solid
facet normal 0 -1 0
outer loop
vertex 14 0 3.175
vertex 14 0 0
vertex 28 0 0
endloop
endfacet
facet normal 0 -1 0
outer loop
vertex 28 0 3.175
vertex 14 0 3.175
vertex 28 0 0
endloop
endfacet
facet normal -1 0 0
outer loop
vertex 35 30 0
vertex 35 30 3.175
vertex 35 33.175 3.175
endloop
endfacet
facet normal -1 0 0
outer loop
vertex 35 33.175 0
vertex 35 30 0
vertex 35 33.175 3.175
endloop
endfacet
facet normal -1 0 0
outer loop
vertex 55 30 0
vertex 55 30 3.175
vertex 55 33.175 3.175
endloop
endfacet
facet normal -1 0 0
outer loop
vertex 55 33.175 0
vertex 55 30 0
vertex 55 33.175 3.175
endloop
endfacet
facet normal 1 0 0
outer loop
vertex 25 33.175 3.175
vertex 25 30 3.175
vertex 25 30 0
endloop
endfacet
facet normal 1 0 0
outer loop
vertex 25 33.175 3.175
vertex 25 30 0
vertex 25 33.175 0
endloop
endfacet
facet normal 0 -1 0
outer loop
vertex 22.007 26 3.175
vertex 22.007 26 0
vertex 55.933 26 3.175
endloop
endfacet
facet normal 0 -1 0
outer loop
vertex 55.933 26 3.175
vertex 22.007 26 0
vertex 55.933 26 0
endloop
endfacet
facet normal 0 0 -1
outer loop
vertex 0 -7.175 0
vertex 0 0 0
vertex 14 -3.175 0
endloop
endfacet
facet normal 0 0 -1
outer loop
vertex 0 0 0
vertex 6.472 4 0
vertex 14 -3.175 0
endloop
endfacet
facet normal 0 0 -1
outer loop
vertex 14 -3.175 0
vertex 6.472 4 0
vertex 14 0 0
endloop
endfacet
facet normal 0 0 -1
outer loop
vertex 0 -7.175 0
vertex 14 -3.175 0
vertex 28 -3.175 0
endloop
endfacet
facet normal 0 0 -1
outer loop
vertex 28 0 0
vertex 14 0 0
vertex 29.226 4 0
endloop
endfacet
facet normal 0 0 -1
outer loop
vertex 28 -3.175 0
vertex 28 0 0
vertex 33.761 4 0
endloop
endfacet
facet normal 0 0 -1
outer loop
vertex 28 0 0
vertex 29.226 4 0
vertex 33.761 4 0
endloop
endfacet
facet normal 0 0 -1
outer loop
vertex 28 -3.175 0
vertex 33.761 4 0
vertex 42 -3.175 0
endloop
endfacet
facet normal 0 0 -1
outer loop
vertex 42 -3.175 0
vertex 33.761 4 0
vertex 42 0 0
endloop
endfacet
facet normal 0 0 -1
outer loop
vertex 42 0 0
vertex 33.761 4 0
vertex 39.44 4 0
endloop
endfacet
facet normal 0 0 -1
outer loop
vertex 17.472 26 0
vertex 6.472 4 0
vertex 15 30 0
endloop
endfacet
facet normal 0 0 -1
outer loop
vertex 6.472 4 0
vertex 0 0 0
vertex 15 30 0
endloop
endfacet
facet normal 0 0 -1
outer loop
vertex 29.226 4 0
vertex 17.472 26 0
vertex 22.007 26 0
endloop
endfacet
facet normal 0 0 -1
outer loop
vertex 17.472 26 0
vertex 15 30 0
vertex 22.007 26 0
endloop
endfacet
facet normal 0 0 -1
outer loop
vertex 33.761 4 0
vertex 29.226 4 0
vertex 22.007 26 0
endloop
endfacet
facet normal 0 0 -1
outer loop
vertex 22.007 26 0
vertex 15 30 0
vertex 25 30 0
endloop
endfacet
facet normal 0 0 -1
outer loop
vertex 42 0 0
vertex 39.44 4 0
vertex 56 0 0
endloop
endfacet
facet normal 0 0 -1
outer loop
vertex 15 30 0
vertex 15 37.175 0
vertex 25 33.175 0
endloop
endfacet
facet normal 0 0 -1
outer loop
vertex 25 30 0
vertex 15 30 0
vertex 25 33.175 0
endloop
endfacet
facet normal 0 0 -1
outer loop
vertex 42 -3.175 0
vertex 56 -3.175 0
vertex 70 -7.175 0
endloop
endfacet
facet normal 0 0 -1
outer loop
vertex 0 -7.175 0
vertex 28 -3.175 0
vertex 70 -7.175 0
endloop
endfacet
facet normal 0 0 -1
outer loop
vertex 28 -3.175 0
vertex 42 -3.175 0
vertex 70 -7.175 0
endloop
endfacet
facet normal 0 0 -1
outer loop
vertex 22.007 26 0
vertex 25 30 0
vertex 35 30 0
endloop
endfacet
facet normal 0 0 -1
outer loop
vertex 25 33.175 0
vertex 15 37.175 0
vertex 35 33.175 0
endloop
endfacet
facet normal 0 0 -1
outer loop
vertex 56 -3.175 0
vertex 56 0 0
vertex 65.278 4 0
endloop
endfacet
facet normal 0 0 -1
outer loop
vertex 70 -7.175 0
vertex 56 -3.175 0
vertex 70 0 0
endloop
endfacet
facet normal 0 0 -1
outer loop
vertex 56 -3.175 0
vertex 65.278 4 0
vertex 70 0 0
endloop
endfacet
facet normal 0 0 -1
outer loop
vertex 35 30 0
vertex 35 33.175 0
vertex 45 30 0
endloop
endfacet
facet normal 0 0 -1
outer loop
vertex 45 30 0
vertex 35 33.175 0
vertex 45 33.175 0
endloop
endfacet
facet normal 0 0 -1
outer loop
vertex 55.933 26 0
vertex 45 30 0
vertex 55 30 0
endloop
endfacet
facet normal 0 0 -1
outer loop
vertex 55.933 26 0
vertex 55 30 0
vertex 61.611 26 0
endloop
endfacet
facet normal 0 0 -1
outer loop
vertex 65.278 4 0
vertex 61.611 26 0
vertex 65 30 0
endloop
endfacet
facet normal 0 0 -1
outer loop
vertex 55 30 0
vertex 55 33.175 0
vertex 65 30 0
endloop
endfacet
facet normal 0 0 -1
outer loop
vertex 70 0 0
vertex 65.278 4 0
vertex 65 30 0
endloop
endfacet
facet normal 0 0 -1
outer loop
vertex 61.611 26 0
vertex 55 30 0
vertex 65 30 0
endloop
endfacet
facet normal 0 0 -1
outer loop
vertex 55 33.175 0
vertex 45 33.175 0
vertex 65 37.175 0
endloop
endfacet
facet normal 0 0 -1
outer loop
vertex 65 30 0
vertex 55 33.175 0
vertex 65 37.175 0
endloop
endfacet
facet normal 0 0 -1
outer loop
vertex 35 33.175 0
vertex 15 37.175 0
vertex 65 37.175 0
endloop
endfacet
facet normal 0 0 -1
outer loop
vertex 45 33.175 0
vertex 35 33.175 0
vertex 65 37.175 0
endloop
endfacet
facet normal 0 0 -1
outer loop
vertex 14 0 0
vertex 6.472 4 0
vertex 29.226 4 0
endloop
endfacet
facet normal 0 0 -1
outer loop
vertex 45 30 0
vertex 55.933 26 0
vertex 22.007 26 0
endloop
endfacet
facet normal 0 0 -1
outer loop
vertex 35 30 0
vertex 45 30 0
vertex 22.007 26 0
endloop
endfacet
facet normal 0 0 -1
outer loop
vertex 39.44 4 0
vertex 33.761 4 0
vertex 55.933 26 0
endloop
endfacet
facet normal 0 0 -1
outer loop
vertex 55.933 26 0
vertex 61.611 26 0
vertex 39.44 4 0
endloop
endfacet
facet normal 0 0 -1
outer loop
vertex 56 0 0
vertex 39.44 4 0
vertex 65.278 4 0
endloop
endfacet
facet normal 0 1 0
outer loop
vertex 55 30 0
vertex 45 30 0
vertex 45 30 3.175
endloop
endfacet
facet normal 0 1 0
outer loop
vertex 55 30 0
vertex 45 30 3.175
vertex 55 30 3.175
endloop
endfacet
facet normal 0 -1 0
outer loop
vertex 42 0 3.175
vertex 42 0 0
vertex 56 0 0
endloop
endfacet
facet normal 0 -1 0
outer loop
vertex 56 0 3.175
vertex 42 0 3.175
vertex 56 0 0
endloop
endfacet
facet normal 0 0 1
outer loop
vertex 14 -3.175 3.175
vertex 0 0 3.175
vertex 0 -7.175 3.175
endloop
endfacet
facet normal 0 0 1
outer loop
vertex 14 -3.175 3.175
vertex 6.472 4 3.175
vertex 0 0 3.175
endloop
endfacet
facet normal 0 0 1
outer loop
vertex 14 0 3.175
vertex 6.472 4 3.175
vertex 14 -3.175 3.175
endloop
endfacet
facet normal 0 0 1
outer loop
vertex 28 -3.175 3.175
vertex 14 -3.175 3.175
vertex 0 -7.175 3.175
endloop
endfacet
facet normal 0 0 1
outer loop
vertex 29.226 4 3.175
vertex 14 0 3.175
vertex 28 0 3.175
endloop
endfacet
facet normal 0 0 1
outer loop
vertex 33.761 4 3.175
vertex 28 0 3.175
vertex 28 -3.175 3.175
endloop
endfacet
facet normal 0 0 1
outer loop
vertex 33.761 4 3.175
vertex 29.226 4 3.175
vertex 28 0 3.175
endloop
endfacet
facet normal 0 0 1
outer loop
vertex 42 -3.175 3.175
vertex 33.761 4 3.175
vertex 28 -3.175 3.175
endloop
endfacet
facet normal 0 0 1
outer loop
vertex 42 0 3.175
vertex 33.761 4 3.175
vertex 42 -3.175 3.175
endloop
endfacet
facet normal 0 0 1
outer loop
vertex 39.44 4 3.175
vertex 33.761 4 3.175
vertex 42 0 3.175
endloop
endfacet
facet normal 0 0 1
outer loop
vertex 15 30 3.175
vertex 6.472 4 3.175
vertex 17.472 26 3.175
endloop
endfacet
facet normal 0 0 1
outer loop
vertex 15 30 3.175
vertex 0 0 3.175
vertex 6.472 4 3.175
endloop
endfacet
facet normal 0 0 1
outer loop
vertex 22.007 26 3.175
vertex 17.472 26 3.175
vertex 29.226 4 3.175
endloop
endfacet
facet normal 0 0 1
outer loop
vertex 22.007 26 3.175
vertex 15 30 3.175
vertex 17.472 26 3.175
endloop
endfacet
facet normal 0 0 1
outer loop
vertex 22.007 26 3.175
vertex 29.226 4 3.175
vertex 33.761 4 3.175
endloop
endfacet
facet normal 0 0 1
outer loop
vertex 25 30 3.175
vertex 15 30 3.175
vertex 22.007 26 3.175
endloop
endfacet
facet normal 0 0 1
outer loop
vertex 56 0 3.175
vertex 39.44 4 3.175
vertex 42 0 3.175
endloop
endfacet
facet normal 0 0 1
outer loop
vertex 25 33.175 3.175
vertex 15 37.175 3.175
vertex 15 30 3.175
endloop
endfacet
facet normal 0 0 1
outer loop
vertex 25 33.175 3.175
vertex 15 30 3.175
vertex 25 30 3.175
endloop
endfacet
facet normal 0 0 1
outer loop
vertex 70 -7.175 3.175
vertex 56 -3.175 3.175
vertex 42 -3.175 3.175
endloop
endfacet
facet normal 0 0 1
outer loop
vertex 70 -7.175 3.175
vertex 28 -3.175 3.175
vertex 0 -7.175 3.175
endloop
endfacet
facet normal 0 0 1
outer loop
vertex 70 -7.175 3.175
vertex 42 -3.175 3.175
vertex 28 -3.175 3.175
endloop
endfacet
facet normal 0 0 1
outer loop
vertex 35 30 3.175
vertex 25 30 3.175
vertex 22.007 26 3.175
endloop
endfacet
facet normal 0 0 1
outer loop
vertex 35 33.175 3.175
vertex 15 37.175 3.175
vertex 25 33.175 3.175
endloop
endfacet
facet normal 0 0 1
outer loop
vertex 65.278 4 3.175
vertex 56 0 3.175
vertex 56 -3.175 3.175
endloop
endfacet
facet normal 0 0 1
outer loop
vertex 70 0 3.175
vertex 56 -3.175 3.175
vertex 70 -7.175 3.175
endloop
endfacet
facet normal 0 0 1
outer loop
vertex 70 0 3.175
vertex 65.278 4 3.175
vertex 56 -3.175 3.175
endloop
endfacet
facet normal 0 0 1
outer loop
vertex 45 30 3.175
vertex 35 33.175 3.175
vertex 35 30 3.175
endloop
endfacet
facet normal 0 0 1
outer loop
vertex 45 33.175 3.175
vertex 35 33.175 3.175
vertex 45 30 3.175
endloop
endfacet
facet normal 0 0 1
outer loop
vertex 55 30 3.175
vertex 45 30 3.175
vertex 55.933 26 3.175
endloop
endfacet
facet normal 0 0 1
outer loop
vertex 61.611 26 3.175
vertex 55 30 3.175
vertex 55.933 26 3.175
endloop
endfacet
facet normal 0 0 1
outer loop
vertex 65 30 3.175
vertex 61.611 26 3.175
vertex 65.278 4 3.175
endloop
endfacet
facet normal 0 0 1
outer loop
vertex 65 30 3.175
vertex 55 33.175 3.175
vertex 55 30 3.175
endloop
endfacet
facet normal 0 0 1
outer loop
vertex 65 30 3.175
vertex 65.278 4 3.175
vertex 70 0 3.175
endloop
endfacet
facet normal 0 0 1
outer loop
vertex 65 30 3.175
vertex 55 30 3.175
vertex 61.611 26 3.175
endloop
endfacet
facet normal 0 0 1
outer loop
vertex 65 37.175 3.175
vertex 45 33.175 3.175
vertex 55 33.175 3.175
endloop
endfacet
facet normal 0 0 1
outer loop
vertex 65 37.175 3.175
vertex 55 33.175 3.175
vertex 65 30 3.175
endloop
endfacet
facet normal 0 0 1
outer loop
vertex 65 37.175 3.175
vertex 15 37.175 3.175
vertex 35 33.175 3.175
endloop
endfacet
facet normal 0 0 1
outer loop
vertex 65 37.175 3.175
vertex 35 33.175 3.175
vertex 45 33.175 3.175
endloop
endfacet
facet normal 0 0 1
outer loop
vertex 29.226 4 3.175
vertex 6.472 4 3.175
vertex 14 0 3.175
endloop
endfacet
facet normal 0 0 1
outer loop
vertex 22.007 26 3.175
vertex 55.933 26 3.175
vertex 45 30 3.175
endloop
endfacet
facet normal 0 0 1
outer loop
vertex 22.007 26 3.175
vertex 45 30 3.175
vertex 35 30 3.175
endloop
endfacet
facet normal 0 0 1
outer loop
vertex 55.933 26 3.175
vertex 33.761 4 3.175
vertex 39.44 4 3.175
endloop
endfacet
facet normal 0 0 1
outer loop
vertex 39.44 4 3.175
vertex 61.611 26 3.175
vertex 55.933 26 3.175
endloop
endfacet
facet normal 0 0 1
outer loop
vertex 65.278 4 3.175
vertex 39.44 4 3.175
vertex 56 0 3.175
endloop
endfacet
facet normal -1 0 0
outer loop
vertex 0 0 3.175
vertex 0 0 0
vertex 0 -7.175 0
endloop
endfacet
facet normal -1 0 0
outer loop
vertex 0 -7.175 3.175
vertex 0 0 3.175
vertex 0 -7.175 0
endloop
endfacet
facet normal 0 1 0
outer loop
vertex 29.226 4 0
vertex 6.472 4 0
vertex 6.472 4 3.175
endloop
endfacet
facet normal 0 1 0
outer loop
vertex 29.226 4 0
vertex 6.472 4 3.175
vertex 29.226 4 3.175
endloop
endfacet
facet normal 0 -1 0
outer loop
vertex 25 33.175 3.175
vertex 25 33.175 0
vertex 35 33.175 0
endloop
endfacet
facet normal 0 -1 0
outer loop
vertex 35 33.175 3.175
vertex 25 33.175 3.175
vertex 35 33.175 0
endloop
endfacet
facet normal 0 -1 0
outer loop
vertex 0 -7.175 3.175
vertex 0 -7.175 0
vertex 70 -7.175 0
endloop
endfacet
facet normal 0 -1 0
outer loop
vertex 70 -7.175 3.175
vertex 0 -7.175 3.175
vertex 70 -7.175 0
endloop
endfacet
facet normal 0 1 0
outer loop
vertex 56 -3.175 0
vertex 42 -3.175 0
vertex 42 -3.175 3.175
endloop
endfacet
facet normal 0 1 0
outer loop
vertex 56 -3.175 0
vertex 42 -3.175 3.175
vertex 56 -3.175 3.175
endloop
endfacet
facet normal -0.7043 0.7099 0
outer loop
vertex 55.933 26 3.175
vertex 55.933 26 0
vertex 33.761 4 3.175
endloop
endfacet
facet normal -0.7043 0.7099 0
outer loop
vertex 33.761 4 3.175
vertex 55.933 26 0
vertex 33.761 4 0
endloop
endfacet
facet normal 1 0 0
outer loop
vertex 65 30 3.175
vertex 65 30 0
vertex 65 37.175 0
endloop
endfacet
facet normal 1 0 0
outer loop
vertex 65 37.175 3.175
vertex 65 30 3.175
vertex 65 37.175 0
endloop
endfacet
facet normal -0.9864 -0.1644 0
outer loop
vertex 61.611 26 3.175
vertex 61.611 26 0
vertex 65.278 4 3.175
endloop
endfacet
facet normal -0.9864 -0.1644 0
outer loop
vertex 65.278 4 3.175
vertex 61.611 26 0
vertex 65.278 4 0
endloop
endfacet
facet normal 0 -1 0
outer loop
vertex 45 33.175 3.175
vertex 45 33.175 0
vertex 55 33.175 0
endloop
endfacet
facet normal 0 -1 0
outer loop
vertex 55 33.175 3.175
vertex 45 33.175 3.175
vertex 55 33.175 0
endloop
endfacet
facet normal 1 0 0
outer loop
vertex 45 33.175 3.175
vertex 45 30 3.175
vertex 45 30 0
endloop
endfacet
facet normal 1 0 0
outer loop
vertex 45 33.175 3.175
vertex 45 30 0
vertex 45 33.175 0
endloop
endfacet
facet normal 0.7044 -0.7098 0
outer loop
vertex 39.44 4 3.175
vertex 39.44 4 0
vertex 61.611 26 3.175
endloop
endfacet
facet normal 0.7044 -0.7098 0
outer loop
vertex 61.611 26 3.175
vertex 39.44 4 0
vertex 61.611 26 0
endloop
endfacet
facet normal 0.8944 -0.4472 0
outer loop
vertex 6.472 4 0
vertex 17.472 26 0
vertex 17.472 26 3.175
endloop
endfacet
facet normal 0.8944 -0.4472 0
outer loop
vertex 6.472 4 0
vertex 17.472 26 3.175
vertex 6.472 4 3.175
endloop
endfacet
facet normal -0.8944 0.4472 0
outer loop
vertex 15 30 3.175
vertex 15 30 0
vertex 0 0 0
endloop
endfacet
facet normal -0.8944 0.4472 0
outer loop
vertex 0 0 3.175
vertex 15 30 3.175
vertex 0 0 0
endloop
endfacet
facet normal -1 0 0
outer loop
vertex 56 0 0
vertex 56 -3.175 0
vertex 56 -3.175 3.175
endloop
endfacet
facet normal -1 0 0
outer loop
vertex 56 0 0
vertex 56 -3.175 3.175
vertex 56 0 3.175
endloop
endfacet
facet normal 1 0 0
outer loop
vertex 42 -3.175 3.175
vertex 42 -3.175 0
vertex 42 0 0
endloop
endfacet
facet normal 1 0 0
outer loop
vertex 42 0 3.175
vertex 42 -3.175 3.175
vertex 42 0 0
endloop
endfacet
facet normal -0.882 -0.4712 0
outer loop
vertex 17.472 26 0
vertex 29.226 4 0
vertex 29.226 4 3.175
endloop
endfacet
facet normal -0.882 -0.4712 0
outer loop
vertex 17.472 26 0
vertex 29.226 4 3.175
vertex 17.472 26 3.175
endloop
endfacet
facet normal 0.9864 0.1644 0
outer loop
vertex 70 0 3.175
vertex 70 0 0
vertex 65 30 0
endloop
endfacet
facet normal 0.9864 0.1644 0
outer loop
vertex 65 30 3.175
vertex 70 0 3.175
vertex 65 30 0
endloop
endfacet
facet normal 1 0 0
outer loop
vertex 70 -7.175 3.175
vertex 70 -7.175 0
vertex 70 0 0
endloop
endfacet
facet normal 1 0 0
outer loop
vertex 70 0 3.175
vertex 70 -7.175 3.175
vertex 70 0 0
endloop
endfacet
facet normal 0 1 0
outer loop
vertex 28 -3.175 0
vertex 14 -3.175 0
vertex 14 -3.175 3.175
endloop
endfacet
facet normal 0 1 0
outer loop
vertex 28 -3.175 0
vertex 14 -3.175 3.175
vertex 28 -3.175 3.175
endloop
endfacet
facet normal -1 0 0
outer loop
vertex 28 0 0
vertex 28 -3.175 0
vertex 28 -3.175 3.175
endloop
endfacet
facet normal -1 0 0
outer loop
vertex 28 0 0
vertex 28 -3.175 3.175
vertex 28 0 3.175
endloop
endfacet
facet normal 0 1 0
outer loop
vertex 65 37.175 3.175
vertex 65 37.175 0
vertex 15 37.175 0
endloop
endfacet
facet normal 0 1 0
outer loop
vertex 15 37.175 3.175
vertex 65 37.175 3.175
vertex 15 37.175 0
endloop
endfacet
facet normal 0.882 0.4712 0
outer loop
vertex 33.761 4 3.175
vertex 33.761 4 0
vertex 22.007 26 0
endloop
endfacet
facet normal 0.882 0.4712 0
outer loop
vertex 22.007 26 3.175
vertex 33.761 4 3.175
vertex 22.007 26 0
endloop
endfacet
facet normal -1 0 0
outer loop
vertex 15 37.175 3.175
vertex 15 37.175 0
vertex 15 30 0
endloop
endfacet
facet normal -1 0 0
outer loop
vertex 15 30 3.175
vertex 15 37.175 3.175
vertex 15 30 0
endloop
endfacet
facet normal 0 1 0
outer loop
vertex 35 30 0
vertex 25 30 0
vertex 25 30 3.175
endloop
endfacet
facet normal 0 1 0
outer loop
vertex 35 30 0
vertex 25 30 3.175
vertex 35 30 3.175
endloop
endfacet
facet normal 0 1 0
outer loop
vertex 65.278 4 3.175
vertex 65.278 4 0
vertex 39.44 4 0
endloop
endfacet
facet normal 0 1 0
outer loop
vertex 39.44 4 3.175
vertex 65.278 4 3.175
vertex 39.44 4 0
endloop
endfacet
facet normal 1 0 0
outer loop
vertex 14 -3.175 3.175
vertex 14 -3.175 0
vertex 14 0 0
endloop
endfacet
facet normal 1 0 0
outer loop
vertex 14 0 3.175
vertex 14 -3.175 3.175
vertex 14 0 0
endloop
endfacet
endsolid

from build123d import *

# Parameters (mm, degrees)
SKETCH1_W           = 10
SKETCH1_H           = 3.175
SKETCH1_W_2         = 14
BOSS_EXTRUDE1_DEPTH = 3.175
CUT_EXTRUDE1_REACH  = 81.323


with BuildPart() as part:
    # Sketch1 → Boss-Extrude1 (new body)
    with BuildSketch(Plane.XY):
        Polygon((15, 30), (0, 0), (0, -7.175), (70, -7.175), (70, 0), (65, 30), (65, 37.175), (15, 37.175), align=None)
        with Locations((30, 31.5875)):
            Rectangle(SKETCH1_W, SKETCH1_H, mode=Mode.SUBTRACT)
        with Locations((21, -1.5875)):
            Rectangle(SKETCH1_W_2, SKETCH1_H, mode=Mode.SUBTRACT)
        with Locations((50, 31.5875)):
            Rectangle(SKETCH1_W, SKETCH1_H, mode=Mode.SUBTRACT)
        with Locations((49, -1.5875)):
            Rectangle(SKETCH1_W_2, SKETCH1_H, mode=Mode.SUBTRACT)
    extrude(amount=BOSS_EXTRUDE1_DEPTH)

    # Sketch2 → Cut-Extrude1 (cut, up to next)
    with BuildSketch(Plane.XY, mode=Mode.PRIVATE) as cut_extrude1_sk1:
        Polygon((61.611491646, 26), (65.278158313, 4), (39.440376301, 4), align=None)
    cut_extrude1_tool1 = extrude(cut_extrude1_sk1.sketch, amount=CUT_EXTRUDE1_REACH, mode=Mode.PRIVATE) & part.part
    # Sketch2 → Cut-Extrude1 (cut, up to next)
    with BuildSketch(Plane.XY, mode=Mode.PRIVATE) as cut_extrude1_sk2:
        Polygon((55.932595363, 26), (33.761480018, 4), (22.00725781, 26), align=None)
    cut_extrude1_tool2 = extrude(cut_extrude1_sk2.sketch, amount=CUT_EXTRUDE1_REACH, mode=Mode.PRIVATE) & part.part
    # Sketch2 → Cut-Extrude1 (cut, up to next)
    with BuildSketch(Plane.XY, mode=Mode.PRIVATE) as cut_extrude1_sk3:
        Polygon((17.472135955, 26), (6.472135955, 4), (29.226358163, 4), align=None)
    cut_extrude1_tool3 = extrude(cut_extrude1_sk3.sketch, amount=CUT_EXTRUDE1_REACH, mode=Mode.PRIVATE) & part.part
    add(cut_extrude1_tool1.solids().sort_by_distance((55.443342, 11.333333, 0))[0], mode=Mode.SUBTRACT)
    add(cut_extrude1_tool2.solids().sort_by_distance((37.233778, 18.666667, 0))[0], mode=Mode.SUBTRACT)
    add(cut_extrude1_tool3.solids().sort_by_distance((17.723543, 11.333333, 0))[0], mode=Mode.SUBTRACT)


solid = part.part
